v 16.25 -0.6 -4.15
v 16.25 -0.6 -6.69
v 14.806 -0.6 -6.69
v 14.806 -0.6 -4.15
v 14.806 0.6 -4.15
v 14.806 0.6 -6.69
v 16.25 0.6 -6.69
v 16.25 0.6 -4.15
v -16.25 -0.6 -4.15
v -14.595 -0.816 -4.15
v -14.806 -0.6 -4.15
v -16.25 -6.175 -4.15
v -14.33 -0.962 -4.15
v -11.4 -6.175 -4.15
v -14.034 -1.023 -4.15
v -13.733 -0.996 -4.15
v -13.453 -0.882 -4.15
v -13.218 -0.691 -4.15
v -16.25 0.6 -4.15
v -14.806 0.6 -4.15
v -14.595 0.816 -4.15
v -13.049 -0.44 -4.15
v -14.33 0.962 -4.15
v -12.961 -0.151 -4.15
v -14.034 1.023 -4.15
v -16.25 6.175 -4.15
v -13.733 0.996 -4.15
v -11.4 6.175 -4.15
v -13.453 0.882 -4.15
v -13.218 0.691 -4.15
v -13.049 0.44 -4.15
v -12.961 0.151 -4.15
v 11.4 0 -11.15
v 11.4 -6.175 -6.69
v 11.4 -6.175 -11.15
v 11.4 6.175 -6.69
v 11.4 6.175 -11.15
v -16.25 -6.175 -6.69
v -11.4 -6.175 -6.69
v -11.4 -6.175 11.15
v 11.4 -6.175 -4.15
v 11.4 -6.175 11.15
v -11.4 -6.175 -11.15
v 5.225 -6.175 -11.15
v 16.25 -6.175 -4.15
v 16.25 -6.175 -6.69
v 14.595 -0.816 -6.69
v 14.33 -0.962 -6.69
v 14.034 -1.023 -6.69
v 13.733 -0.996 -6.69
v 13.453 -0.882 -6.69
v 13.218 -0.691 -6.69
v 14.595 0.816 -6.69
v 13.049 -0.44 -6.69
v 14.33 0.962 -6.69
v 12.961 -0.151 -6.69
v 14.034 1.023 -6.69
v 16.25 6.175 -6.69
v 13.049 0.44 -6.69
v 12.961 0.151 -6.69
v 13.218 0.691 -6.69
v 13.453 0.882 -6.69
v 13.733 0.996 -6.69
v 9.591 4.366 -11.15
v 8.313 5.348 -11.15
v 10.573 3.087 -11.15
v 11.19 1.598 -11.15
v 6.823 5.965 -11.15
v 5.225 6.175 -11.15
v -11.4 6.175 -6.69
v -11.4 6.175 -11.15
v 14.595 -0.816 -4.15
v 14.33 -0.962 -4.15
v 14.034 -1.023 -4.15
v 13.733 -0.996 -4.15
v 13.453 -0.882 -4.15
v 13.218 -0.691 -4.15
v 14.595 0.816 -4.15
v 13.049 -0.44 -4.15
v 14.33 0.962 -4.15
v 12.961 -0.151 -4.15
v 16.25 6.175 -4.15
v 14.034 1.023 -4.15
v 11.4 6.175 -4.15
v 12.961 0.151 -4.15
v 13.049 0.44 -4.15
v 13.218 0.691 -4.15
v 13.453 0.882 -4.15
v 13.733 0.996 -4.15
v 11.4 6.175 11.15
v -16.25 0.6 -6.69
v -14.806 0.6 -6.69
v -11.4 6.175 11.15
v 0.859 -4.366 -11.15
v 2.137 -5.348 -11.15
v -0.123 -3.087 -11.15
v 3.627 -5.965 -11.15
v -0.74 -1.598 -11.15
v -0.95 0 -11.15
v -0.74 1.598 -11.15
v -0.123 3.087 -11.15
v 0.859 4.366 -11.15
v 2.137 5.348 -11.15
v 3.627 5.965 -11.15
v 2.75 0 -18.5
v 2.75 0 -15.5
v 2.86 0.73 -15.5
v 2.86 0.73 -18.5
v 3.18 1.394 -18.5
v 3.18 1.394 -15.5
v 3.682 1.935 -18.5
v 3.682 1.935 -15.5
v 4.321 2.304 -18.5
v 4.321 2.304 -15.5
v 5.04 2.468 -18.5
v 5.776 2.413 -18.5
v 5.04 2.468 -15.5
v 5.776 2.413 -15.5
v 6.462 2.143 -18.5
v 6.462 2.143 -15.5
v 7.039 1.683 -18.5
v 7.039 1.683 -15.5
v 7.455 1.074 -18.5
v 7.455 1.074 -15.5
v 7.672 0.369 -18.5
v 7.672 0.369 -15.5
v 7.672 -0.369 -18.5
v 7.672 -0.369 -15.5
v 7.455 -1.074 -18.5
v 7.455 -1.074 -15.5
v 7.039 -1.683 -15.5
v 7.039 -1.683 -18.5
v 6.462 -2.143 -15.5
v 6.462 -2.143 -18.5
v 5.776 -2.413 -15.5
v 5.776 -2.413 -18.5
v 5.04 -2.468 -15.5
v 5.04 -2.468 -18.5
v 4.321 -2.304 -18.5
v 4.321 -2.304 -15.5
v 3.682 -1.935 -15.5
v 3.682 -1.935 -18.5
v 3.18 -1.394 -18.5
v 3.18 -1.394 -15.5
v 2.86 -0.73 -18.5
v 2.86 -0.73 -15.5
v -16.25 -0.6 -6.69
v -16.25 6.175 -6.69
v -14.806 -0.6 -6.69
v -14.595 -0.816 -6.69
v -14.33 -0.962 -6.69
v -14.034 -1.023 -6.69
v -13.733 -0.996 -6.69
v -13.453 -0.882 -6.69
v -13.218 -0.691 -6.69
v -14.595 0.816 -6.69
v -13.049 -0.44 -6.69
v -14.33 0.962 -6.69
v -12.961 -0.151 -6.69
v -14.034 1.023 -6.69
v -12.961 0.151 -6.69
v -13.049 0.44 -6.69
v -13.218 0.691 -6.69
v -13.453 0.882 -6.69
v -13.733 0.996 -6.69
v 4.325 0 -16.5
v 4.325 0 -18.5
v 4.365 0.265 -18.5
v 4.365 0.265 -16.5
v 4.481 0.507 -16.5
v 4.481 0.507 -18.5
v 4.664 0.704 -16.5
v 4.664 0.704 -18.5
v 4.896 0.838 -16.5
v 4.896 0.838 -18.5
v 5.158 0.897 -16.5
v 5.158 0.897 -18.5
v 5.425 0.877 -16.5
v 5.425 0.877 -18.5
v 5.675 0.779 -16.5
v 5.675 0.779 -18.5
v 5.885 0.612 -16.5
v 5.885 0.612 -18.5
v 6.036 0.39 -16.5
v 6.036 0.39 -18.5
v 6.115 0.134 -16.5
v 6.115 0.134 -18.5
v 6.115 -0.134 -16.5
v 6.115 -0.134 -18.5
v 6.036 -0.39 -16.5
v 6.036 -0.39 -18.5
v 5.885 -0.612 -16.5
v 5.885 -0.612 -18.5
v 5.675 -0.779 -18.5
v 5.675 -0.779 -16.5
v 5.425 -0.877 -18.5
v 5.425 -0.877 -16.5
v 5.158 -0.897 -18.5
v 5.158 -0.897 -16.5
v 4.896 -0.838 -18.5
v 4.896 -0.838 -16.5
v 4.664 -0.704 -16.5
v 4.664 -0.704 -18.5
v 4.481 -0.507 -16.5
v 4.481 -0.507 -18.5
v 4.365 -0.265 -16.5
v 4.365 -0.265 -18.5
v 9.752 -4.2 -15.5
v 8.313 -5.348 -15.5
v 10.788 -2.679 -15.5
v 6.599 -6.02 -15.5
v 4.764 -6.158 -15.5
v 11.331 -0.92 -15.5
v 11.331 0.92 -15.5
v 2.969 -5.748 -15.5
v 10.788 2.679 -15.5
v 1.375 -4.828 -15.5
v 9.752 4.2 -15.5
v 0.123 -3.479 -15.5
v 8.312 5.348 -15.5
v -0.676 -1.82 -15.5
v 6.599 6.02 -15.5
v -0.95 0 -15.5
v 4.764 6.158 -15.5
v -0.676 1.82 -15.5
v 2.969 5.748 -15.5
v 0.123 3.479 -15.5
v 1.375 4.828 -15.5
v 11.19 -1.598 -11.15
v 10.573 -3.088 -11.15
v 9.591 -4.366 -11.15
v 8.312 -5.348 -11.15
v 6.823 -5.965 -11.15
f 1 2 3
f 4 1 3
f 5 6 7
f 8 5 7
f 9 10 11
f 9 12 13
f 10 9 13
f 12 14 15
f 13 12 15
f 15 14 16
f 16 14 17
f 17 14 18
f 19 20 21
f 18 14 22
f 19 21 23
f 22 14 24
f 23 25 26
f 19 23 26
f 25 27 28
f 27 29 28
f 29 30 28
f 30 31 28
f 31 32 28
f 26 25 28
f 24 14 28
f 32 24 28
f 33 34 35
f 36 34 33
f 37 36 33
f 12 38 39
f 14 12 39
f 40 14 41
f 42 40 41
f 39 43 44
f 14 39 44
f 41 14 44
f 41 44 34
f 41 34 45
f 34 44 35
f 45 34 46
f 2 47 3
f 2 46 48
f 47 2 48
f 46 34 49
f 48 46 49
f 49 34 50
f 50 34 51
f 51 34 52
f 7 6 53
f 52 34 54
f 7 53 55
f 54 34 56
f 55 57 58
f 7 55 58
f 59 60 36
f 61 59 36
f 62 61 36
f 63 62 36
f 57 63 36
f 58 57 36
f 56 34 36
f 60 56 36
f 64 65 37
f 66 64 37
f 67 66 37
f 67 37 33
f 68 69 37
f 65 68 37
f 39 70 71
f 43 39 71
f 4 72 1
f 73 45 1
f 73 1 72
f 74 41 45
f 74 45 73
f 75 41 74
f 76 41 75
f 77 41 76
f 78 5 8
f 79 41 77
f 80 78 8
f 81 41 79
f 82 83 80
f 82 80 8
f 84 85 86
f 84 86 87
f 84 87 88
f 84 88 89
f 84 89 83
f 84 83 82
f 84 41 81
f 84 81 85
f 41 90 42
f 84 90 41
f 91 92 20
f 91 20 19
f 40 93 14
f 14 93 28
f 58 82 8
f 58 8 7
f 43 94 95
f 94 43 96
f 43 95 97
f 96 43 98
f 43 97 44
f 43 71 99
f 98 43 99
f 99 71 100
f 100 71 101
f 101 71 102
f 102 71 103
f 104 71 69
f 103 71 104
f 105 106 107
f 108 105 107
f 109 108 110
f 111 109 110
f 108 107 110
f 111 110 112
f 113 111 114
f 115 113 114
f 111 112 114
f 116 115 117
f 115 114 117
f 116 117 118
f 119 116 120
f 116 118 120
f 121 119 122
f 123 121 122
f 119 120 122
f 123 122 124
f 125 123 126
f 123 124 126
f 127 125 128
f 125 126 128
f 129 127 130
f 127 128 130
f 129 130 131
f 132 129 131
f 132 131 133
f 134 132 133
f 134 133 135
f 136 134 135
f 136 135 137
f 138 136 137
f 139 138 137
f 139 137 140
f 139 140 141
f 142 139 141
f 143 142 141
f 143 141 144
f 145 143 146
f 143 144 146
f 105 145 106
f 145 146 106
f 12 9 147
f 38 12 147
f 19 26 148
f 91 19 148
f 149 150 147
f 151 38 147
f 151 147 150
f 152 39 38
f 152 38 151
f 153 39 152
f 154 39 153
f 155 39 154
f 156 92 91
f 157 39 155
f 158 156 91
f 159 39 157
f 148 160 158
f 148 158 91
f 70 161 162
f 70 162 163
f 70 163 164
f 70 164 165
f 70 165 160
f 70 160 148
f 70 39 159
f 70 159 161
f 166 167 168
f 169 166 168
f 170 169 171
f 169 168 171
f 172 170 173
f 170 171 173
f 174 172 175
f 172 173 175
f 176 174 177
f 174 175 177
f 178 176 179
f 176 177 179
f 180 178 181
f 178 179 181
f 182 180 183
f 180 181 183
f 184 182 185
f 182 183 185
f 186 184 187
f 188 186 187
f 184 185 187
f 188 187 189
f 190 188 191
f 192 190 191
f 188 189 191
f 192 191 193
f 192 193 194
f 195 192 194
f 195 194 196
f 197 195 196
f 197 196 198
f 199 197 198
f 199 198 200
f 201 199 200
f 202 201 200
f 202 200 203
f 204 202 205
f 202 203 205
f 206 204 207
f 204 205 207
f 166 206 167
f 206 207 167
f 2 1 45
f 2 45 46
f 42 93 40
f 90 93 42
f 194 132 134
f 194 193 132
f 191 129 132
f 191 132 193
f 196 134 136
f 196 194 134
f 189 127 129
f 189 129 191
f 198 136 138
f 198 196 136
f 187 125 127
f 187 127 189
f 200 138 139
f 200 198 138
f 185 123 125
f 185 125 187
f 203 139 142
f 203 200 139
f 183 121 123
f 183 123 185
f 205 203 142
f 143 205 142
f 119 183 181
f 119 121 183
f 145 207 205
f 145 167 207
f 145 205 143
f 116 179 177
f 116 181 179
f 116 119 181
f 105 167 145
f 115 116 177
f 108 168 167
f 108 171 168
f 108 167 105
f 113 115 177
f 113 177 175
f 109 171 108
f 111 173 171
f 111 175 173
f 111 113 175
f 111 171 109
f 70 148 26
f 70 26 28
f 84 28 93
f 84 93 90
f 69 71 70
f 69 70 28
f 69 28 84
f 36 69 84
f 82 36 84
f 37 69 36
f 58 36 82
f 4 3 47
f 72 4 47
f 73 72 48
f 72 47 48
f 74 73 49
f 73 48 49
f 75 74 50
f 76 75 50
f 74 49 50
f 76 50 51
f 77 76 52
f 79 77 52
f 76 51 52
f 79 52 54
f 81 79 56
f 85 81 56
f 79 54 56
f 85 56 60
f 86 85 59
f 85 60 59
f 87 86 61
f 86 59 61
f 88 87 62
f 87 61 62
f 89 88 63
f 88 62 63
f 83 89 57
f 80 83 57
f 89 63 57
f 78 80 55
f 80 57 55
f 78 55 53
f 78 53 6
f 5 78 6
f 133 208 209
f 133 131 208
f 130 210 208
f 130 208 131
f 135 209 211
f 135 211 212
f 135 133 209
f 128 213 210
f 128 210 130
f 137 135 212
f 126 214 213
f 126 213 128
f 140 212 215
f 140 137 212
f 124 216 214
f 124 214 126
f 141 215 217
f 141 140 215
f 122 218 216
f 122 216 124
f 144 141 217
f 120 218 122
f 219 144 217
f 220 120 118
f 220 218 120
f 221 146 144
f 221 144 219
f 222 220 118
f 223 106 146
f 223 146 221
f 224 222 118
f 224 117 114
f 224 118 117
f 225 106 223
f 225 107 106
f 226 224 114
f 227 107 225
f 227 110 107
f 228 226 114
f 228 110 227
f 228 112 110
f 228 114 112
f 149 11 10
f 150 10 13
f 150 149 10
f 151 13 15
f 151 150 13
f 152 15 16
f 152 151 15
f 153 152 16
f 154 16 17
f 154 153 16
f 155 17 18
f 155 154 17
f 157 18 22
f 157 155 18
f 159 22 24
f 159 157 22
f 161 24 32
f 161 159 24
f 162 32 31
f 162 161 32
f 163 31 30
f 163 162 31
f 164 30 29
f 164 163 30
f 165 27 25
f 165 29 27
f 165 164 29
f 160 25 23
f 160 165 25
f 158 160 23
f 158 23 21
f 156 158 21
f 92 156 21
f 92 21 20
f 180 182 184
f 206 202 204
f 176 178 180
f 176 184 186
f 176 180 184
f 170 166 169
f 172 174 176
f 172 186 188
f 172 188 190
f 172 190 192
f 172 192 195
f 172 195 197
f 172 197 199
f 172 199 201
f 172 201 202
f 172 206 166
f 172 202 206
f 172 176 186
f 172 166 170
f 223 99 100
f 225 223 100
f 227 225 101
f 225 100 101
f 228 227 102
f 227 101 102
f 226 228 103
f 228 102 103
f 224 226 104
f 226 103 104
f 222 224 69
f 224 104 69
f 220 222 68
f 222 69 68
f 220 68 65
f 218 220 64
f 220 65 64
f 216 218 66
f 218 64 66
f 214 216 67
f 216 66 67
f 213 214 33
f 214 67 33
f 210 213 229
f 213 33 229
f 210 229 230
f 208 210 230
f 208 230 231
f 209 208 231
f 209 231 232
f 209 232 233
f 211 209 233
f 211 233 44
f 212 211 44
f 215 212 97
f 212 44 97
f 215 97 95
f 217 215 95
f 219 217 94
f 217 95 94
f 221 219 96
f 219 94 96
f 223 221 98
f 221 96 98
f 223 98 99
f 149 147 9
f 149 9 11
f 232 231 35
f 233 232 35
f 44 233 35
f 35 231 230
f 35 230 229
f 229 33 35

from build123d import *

# Parameters (mm, degrees)
SKETCH1_W           = 22.8
SKETCH1_H           = 22.3
BOSS_EXTRUDE1_DEPTH = 6.175
SKETCH2_W           = 2.54
SKETCH2_H           = 12.35
BOSS_EXTRUDE2_DEPTH = 4.85
CUT_EXTRUDE1_DEPTH  = 18.84
SKETCH4_R           = 6.175
BOSS_EXTRUDE3_DEPTH = 4.35
SKETCH5_R           = 2.475
BOSS_EXTRUDE4_DEPTH = 3
SKETCH6_R           = 0.9
CUT_EXTRUDE2_DEPTH  = 2


with BuildPart() as part:
    # Sketch1 → Boss-Extrude1 (new body, symmetric)
    with BuildSketch(Plane(origin=(0, 0, 0), x_dir=(1, 0, 0), z_dir=(0, 1, 0))):
        Rectangle(SKETCH1_W, SKETCH1_H)
    extrude(amount=BOSS_EXTRUDE1_DEPTH, both=True)

    # Sketch2 → Boss-Extrude2 (add)
    with BuildSketch(Plane(origin=(11.4, 0, 0), x_dir=(0, 0, -1), z_dir=(1, 0, 0))):
        with Locations((5.42, 0)):
            Rectangle(SKETCH2_W, SKETCH2_H)
    boss_extrude2 = extrude(amount=BOSS_EXTRUDE2_DEPTH)

    # Mirror1: Boss-Extrude2 across plane
    add(boss_extrude2.mirror(Plane(origin=(0, 0, 0), x_dir=(0, 0, 1), z_dir=(1, 0, 0))))

    # Sketch3 → Cut-Extrude1 (cut, through all)
    with BuildSketch(Plane(origin=(0, 0, -6.69), x_dir=(-1, 0, 0), z_dir=(0, 0, -1))):
        with BuildLine():
            Line((-14.806038507, 0.6), (-16.25, 0.6))
            Line((-16.25, 0.6), (-16.25, -0.6))
            Line((-16.25, -0.6), (-14.806038507, -0.6))
            ThreePointArc((-14.806038507, -0.6), (-12.95, 0), (-14.806038507, 0.6))
        make_face()
        with BuildLine():
            Line((14.806038507, 0.6), (16.25, 0.6))
            Line((16.25, 0.6), (16.25, -0.6))
            Line((16.25, -0.6), (14.806038507, -0.6))
            ThreePointArc((14.806038507, -0.6), (12.95, 0), (14.806038507, 0.6))
        make_face()
    extrude(amount=-CUT_EXTRUDE1_DEPTH, mode=Mode.SUBTRACT)

    # Sketch4 → Boss-Extrude3 (add)
    with BuildSketch(Plane(origin=(0, 0, -11.15), x_dir=(-1, 0, 0), z_dir=(0, 0, -1))):
        with Locations((-5.225, 0)):
            Circle(SKETCH4_R)
    extrude(amount=BOSS_EXTRUDE3_DEPTH)

    # Sketch5 → Boss-Extrude4 (add)
    with BuildSketch(Plane(origin=(0, 0, -15.5), x_dir=(-1, 0, 0), z_dir=(0, 0, -1))):
        with Locations((-5.225, 0)):
            Circle(SKETCH5_R)
    extrude(amount=BOSS_EXTRUDE4_DEPTH)

    # Sketch6 → Cut-Extrude2 (cut)
    with BuildSketch(Plane(origin=(0, 0, -18.5), x_dir=(-1, 0, 0), z_dir=(0, 0, -1))):
        with Locations((-5.225, 0)):
            Circle(SKETCH6_R)
    extrude(amount=-CUT_EXTRUDE2_DEPTH, mode=Mode.SUBTRACT)


solid = part.part
